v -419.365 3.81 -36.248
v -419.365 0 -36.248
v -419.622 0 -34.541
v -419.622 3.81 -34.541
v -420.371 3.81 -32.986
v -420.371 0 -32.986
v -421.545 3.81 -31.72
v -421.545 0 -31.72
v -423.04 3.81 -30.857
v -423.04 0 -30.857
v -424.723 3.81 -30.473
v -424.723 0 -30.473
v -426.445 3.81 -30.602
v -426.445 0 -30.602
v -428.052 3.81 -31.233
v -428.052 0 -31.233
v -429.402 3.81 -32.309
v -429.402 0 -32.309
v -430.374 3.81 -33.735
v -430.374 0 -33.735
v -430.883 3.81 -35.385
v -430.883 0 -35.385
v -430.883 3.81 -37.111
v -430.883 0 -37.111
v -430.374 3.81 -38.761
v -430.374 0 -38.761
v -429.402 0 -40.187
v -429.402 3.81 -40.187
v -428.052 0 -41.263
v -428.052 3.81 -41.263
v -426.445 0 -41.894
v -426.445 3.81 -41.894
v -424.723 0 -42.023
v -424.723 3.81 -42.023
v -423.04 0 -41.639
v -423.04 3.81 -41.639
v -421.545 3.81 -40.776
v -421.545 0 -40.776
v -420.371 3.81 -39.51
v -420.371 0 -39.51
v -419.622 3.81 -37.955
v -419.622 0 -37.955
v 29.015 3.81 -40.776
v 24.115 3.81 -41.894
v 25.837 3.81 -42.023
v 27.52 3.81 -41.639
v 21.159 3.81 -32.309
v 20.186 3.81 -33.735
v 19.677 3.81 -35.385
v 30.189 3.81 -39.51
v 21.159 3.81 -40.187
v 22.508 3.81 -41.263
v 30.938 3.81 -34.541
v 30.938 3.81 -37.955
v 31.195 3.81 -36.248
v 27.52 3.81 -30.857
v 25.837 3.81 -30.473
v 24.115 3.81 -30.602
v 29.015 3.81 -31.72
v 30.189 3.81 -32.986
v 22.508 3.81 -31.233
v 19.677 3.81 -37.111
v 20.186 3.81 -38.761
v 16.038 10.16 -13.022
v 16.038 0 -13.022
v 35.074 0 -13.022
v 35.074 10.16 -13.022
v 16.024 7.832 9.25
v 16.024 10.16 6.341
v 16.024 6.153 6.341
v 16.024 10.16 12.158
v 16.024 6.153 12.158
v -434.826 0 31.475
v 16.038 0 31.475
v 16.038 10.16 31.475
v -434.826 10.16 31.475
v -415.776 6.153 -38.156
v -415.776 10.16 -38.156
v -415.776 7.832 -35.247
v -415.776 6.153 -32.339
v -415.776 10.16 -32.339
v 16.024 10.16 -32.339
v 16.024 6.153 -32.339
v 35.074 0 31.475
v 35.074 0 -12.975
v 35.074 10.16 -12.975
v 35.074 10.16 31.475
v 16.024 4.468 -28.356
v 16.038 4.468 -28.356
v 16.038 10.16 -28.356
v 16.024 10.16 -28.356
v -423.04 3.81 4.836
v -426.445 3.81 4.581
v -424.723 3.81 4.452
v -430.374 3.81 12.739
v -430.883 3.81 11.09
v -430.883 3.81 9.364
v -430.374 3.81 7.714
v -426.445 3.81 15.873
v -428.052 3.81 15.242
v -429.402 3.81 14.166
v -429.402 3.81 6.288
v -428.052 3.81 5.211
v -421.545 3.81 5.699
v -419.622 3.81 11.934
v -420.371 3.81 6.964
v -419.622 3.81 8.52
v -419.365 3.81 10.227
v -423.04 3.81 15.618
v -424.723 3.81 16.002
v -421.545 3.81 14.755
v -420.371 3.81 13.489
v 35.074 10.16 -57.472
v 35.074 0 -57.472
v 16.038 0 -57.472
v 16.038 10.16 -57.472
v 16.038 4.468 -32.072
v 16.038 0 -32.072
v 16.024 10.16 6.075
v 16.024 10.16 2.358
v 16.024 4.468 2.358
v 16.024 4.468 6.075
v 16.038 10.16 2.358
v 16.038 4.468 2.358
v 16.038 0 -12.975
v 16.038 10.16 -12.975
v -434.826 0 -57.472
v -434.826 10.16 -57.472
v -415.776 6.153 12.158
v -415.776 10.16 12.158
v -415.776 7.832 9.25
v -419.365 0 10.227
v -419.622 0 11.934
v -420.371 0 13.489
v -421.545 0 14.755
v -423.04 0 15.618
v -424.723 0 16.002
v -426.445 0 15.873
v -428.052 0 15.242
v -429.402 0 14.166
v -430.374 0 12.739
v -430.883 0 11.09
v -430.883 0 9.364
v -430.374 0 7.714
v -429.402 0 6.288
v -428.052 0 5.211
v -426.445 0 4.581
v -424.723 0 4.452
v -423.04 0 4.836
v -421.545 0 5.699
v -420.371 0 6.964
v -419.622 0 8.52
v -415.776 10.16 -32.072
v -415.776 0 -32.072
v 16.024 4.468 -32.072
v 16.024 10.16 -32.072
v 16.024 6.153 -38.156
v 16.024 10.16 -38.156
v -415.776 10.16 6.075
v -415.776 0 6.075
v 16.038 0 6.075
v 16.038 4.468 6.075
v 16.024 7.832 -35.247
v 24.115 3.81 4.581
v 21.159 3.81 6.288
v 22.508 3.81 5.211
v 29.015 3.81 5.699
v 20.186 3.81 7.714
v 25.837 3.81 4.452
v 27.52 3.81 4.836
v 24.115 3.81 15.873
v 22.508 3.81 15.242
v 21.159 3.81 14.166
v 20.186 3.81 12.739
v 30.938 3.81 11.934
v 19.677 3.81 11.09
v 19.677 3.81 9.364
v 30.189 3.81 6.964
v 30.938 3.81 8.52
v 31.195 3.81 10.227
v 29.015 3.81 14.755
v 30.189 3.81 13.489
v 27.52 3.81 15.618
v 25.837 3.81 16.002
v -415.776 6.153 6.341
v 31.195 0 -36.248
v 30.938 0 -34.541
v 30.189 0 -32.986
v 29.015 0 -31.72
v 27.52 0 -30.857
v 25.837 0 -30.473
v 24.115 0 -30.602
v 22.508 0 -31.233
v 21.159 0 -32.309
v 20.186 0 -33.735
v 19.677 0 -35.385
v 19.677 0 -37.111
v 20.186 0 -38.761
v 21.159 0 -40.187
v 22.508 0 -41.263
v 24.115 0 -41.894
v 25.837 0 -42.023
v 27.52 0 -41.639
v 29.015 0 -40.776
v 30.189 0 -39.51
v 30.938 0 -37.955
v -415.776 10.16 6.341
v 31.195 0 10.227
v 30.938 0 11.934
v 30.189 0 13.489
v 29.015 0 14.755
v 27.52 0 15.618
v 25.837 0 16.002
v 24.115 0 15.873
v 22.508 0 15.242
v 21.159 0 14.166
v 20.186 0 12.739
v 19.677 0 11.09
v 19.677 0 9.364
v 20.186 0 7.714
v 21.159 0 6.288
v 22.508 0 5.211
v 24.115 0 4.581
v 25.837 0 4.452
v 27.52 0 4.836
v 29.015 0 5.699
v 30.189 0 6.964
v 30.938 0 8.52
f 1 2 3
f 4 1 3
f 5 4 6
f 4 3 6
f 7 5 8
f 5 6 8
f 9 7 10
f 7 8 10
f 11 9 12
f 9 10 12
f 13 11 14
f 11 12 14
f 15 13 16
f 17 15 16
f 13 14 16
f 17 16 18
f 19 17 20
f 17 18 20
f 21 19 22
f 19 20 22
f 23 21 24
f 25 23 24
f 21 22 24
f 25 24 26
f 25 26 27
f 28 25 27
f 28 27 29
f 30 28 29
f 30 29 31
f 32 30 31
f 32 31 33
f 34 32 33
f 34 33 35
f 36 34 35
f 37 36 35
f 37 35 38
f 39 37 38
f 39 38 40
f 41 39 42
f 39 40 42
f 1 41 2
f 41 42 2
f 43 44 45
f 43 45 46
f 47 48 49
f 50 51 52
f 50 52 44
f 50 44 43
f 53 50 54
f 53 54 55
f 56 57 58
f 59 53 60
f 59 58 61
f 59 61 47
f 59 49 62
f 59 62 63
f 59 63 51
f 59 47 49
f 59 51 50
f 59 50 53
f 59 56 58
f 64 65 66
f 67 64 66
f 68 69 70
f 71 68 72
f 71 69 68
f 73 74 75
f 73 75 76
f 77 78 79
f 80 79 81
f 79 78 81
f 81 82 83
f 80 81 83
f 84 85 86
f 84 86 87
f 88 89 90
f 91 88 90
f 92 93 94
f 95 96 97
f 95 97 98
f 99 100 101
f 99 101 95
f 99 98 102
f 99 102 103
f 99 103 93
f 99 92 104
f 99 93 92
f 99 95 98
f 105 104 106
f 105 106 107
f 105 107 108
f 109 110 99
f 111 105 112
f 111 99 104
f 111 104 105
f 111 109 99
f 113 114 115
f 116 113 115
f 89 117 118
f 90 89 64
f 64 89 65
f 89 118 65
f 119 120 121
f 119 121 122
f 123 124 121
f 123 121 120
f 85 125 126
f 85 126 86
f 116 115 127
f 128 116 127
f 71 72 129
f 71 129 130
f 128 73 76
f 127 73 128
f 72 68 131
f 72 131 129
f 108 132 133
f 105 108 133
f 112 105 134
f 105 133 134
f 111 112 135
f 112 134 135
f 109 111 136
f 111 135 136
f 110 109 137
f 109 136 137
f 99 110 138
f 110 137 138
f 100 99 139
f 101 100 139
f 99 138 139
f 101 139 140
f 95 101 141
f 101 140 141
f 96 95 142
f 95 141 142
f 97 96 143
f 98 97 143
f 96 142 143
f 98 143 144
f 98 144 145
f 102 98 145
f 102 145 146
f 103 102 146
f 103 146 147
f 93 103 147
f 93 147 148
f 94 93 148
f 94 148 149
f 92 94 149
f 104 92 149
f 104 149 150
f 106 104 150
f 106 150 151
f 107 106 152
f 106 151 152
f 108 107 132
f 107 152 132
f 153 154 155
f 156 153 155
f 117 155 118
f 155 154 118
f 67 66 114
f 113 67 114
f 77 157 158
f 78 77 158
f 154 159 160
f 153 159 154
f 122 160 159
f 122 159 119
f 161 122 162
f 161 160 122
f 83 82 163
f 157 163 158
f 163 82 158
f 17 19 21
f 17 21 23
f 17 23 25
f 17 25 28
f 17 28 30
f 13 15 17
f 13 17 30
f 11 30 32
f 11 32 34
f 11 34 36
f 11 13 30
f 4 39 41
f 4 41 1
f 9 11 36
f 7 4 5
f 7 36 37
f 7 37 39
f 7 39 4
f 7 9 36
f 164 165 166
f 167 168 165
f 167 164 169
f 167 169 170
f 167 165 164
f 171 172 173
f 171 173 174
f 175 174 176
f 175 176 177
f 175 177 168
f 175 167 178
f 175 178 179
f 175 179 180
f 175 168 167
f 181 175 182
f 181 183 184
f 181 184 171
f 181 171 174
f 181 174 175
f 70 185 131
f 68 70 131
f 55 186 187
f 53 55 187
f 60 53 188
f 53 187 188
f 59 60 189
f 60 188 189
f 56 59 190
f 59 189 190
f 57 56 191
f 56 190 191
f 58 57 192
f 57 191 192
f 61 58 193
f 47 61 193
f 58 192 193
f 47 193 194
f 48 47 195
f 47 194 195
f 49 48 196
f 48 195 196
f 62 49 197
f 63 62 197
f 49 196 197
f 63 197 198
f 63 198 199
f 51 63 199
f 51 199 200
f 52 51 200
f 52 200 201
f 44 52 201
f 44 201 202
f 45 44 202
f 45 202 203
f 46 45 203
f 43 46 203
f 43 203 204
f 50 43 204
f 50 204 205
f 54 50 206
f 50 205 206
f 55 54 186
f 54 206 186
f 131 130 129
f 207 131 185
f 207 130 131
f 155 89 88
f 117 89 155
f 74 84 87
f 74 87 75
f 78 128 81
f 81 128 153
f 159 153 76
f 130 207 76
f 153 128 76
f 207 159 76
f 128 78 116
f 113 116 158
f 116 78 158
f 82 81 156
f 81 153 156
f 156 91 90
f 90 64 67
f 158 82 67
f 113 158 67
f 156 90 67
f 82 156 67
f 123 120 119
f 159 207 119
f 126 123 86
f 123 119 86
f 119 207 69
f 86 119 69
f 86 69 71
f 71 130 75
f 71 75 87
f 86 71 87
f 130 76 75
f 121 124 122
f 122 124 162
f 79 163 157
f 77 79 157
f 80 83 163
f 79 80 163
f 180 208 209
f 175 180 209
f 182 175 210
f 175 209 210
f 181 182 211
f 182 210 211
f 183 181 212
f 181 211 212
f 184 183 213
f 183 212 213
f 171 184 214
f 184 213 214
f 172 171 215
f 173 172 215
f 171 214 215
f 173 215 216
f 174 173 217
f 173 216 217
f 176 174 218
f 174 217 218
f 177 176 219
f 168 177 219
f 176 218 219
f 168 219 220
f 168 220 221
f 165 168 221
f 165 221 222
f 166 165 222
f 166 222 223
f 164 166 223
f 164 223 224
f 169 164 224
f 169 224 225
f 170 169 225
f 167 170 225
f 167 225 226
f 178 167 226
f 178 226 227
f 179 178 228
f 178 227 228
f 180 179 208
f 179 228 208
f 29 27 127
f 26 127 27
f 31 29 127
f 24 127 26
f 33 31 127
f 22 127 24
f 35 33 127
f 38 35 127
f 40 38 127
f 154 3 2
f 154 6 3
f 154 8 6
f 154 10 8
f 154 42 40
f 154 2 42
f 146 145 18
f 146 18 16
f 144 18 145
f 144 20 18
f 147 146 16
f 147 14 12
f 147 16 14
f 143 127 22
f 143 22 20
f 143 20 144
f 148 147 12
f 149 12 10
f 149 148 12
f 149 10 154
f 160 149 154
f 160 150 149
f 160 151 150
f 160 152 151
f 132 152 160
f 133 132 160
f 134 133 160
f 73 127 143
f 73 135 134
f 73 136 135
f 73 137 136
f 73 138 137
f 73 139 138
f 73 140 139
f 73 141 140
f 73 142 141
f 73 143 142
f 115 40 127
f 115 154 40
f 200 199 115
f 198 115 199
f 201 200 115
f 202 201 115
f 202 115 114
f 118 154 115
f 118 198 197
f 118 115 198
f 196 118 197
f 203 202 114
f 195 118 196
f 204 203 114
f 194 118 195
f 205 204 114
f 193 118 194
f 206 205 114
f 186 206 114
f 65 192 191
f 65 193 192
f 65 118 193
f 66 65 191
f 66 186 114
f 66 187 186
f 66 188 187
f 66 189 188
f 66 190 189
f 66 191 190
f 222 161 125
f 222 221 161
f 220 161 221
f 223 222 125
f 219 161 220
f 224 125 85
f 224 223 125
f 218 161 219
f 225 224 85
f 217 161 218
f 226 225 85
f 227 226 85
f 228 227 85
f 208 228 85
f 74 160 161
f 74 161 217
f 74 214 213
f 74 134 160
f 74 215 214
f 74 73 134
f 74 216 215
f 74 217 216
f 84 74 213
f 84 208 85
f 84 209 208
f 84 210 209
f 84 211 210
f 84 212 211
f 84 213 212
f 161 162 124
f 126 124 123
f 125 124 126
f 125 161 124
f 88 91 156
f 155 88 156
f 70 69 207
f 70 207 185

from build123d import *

# Parameters (mm, degrees)
BOSS_EXTRUDE1_DEPTH = 10.16
CUT_EXTRUDE1_DEPTH  = 469.9
SKETCH7_W           = 12.402912868
SKETCH7_H           = 5.692085864
BOSS_EXTRUDE2_DEPTH = 19.05
SKETCH8_W           = 44.473666897
SKETCH8_H           = 10.16
BOSS_EXTRUDE3_DEPTH = 19.05
SKETCH11_R          = 5.7912
CUT_EXTRUDE2_DEPTH  = 3.81


with BuildPart() as part:
    # Sketch1 → Boss-Extrude1 (new body)
    with BuildSketch(Plane(origin=(0, 0, 0), x_dir=(1, 0, 0), z_dir=(0, 1, 0))):
        Polygon((16.038025544, 57.472460937), (-434.826171875, 57.472460937), (-434.826171875, 13.022460937), (-415.790369294, 13.022460937), (-415.790369294, 32.072460937), (16.038025544, 32.072460938), align=None)
        Polygon((35.073828125, 57.472460938), (16.038025544, 57.472460937), (16.038025544, 32.072460938), (16.038025544, 13.022460938), (35.073828125, 13.022460938), align=None)
    extrude(amount=BOSS_EXTRUDE1_DEPTH)

    # Sketch3 → Cut-Extrude1 (cut)
    with BuildSketch(Plane(origin=(35.073828125, 0, 0), x_dir=(0, 0, -1), z_dir=(1, 0, 0))):
        Polygon((38.155998325, 6.152693314), (38.155998325, 10.16), (32.33892355, 10.16), (32.33892355, 6.152693314), (35.247460938, 7.831938158), align=None)
    extrude(amount=-CUT_EXTRUDE1_DEPTH, mode=Mode.SUBTRACT)

    # Sketch7 → Boss-Extrude2 (add)
    with BuildSketch(Plane(origin=(35.073828125, 0, 0), x_dir=(0, 0, -1), z_dir=(1, 0, 0))):
        with Locations((34.557393907, 7.313957068)):
            Rectangle(SKETCH7_W, SKETCH7_H)
    extrude(amount=-BOSS_EXTRUDE2_DEPTH)

    # Sketch8 → Boss-Extrude3 (add)
    with BuildSketch(Plane.ZY.offset(434.826171875)):
        with Locations((-35.23562749, 5.08)):
            Rectangle(SKETCH8_W, SKETCH8_H)
    extrude(amount=-BOSS_EXTRUDE3_DEPTH)

    # Mirror1: part across plane


with BuildPart() as part_1:
    add(part.part)
    add(part.part.mirror(Plane(origin=(-415.776171875, 10.16, -12.998794041), x_dir=(1, 0, 0), z_dir=(0, 0, 1))))

    # Sketch11 → Cut-Extrude2 (cut)
    with BuildSketch(Plane.XZ):
        with Locations((-425.156251148, 10.226790326)):
            Circle(SKETCH11_R)
        with Locations((25.403907398, -36.248045304)):
            Circle(SKETCH11_R)
        with Locations((25.403907398, 10.226790326)):
            Circle(SKETCH11_R)
        with Locations((-425.156251148, -36.248045304)):
            Circle(SKETCH11_R)
    extrude(amount=-CUT_EXTRUDE2_DEPTH, mode=Mode.SUBTRACT)


solid = part_1.part
